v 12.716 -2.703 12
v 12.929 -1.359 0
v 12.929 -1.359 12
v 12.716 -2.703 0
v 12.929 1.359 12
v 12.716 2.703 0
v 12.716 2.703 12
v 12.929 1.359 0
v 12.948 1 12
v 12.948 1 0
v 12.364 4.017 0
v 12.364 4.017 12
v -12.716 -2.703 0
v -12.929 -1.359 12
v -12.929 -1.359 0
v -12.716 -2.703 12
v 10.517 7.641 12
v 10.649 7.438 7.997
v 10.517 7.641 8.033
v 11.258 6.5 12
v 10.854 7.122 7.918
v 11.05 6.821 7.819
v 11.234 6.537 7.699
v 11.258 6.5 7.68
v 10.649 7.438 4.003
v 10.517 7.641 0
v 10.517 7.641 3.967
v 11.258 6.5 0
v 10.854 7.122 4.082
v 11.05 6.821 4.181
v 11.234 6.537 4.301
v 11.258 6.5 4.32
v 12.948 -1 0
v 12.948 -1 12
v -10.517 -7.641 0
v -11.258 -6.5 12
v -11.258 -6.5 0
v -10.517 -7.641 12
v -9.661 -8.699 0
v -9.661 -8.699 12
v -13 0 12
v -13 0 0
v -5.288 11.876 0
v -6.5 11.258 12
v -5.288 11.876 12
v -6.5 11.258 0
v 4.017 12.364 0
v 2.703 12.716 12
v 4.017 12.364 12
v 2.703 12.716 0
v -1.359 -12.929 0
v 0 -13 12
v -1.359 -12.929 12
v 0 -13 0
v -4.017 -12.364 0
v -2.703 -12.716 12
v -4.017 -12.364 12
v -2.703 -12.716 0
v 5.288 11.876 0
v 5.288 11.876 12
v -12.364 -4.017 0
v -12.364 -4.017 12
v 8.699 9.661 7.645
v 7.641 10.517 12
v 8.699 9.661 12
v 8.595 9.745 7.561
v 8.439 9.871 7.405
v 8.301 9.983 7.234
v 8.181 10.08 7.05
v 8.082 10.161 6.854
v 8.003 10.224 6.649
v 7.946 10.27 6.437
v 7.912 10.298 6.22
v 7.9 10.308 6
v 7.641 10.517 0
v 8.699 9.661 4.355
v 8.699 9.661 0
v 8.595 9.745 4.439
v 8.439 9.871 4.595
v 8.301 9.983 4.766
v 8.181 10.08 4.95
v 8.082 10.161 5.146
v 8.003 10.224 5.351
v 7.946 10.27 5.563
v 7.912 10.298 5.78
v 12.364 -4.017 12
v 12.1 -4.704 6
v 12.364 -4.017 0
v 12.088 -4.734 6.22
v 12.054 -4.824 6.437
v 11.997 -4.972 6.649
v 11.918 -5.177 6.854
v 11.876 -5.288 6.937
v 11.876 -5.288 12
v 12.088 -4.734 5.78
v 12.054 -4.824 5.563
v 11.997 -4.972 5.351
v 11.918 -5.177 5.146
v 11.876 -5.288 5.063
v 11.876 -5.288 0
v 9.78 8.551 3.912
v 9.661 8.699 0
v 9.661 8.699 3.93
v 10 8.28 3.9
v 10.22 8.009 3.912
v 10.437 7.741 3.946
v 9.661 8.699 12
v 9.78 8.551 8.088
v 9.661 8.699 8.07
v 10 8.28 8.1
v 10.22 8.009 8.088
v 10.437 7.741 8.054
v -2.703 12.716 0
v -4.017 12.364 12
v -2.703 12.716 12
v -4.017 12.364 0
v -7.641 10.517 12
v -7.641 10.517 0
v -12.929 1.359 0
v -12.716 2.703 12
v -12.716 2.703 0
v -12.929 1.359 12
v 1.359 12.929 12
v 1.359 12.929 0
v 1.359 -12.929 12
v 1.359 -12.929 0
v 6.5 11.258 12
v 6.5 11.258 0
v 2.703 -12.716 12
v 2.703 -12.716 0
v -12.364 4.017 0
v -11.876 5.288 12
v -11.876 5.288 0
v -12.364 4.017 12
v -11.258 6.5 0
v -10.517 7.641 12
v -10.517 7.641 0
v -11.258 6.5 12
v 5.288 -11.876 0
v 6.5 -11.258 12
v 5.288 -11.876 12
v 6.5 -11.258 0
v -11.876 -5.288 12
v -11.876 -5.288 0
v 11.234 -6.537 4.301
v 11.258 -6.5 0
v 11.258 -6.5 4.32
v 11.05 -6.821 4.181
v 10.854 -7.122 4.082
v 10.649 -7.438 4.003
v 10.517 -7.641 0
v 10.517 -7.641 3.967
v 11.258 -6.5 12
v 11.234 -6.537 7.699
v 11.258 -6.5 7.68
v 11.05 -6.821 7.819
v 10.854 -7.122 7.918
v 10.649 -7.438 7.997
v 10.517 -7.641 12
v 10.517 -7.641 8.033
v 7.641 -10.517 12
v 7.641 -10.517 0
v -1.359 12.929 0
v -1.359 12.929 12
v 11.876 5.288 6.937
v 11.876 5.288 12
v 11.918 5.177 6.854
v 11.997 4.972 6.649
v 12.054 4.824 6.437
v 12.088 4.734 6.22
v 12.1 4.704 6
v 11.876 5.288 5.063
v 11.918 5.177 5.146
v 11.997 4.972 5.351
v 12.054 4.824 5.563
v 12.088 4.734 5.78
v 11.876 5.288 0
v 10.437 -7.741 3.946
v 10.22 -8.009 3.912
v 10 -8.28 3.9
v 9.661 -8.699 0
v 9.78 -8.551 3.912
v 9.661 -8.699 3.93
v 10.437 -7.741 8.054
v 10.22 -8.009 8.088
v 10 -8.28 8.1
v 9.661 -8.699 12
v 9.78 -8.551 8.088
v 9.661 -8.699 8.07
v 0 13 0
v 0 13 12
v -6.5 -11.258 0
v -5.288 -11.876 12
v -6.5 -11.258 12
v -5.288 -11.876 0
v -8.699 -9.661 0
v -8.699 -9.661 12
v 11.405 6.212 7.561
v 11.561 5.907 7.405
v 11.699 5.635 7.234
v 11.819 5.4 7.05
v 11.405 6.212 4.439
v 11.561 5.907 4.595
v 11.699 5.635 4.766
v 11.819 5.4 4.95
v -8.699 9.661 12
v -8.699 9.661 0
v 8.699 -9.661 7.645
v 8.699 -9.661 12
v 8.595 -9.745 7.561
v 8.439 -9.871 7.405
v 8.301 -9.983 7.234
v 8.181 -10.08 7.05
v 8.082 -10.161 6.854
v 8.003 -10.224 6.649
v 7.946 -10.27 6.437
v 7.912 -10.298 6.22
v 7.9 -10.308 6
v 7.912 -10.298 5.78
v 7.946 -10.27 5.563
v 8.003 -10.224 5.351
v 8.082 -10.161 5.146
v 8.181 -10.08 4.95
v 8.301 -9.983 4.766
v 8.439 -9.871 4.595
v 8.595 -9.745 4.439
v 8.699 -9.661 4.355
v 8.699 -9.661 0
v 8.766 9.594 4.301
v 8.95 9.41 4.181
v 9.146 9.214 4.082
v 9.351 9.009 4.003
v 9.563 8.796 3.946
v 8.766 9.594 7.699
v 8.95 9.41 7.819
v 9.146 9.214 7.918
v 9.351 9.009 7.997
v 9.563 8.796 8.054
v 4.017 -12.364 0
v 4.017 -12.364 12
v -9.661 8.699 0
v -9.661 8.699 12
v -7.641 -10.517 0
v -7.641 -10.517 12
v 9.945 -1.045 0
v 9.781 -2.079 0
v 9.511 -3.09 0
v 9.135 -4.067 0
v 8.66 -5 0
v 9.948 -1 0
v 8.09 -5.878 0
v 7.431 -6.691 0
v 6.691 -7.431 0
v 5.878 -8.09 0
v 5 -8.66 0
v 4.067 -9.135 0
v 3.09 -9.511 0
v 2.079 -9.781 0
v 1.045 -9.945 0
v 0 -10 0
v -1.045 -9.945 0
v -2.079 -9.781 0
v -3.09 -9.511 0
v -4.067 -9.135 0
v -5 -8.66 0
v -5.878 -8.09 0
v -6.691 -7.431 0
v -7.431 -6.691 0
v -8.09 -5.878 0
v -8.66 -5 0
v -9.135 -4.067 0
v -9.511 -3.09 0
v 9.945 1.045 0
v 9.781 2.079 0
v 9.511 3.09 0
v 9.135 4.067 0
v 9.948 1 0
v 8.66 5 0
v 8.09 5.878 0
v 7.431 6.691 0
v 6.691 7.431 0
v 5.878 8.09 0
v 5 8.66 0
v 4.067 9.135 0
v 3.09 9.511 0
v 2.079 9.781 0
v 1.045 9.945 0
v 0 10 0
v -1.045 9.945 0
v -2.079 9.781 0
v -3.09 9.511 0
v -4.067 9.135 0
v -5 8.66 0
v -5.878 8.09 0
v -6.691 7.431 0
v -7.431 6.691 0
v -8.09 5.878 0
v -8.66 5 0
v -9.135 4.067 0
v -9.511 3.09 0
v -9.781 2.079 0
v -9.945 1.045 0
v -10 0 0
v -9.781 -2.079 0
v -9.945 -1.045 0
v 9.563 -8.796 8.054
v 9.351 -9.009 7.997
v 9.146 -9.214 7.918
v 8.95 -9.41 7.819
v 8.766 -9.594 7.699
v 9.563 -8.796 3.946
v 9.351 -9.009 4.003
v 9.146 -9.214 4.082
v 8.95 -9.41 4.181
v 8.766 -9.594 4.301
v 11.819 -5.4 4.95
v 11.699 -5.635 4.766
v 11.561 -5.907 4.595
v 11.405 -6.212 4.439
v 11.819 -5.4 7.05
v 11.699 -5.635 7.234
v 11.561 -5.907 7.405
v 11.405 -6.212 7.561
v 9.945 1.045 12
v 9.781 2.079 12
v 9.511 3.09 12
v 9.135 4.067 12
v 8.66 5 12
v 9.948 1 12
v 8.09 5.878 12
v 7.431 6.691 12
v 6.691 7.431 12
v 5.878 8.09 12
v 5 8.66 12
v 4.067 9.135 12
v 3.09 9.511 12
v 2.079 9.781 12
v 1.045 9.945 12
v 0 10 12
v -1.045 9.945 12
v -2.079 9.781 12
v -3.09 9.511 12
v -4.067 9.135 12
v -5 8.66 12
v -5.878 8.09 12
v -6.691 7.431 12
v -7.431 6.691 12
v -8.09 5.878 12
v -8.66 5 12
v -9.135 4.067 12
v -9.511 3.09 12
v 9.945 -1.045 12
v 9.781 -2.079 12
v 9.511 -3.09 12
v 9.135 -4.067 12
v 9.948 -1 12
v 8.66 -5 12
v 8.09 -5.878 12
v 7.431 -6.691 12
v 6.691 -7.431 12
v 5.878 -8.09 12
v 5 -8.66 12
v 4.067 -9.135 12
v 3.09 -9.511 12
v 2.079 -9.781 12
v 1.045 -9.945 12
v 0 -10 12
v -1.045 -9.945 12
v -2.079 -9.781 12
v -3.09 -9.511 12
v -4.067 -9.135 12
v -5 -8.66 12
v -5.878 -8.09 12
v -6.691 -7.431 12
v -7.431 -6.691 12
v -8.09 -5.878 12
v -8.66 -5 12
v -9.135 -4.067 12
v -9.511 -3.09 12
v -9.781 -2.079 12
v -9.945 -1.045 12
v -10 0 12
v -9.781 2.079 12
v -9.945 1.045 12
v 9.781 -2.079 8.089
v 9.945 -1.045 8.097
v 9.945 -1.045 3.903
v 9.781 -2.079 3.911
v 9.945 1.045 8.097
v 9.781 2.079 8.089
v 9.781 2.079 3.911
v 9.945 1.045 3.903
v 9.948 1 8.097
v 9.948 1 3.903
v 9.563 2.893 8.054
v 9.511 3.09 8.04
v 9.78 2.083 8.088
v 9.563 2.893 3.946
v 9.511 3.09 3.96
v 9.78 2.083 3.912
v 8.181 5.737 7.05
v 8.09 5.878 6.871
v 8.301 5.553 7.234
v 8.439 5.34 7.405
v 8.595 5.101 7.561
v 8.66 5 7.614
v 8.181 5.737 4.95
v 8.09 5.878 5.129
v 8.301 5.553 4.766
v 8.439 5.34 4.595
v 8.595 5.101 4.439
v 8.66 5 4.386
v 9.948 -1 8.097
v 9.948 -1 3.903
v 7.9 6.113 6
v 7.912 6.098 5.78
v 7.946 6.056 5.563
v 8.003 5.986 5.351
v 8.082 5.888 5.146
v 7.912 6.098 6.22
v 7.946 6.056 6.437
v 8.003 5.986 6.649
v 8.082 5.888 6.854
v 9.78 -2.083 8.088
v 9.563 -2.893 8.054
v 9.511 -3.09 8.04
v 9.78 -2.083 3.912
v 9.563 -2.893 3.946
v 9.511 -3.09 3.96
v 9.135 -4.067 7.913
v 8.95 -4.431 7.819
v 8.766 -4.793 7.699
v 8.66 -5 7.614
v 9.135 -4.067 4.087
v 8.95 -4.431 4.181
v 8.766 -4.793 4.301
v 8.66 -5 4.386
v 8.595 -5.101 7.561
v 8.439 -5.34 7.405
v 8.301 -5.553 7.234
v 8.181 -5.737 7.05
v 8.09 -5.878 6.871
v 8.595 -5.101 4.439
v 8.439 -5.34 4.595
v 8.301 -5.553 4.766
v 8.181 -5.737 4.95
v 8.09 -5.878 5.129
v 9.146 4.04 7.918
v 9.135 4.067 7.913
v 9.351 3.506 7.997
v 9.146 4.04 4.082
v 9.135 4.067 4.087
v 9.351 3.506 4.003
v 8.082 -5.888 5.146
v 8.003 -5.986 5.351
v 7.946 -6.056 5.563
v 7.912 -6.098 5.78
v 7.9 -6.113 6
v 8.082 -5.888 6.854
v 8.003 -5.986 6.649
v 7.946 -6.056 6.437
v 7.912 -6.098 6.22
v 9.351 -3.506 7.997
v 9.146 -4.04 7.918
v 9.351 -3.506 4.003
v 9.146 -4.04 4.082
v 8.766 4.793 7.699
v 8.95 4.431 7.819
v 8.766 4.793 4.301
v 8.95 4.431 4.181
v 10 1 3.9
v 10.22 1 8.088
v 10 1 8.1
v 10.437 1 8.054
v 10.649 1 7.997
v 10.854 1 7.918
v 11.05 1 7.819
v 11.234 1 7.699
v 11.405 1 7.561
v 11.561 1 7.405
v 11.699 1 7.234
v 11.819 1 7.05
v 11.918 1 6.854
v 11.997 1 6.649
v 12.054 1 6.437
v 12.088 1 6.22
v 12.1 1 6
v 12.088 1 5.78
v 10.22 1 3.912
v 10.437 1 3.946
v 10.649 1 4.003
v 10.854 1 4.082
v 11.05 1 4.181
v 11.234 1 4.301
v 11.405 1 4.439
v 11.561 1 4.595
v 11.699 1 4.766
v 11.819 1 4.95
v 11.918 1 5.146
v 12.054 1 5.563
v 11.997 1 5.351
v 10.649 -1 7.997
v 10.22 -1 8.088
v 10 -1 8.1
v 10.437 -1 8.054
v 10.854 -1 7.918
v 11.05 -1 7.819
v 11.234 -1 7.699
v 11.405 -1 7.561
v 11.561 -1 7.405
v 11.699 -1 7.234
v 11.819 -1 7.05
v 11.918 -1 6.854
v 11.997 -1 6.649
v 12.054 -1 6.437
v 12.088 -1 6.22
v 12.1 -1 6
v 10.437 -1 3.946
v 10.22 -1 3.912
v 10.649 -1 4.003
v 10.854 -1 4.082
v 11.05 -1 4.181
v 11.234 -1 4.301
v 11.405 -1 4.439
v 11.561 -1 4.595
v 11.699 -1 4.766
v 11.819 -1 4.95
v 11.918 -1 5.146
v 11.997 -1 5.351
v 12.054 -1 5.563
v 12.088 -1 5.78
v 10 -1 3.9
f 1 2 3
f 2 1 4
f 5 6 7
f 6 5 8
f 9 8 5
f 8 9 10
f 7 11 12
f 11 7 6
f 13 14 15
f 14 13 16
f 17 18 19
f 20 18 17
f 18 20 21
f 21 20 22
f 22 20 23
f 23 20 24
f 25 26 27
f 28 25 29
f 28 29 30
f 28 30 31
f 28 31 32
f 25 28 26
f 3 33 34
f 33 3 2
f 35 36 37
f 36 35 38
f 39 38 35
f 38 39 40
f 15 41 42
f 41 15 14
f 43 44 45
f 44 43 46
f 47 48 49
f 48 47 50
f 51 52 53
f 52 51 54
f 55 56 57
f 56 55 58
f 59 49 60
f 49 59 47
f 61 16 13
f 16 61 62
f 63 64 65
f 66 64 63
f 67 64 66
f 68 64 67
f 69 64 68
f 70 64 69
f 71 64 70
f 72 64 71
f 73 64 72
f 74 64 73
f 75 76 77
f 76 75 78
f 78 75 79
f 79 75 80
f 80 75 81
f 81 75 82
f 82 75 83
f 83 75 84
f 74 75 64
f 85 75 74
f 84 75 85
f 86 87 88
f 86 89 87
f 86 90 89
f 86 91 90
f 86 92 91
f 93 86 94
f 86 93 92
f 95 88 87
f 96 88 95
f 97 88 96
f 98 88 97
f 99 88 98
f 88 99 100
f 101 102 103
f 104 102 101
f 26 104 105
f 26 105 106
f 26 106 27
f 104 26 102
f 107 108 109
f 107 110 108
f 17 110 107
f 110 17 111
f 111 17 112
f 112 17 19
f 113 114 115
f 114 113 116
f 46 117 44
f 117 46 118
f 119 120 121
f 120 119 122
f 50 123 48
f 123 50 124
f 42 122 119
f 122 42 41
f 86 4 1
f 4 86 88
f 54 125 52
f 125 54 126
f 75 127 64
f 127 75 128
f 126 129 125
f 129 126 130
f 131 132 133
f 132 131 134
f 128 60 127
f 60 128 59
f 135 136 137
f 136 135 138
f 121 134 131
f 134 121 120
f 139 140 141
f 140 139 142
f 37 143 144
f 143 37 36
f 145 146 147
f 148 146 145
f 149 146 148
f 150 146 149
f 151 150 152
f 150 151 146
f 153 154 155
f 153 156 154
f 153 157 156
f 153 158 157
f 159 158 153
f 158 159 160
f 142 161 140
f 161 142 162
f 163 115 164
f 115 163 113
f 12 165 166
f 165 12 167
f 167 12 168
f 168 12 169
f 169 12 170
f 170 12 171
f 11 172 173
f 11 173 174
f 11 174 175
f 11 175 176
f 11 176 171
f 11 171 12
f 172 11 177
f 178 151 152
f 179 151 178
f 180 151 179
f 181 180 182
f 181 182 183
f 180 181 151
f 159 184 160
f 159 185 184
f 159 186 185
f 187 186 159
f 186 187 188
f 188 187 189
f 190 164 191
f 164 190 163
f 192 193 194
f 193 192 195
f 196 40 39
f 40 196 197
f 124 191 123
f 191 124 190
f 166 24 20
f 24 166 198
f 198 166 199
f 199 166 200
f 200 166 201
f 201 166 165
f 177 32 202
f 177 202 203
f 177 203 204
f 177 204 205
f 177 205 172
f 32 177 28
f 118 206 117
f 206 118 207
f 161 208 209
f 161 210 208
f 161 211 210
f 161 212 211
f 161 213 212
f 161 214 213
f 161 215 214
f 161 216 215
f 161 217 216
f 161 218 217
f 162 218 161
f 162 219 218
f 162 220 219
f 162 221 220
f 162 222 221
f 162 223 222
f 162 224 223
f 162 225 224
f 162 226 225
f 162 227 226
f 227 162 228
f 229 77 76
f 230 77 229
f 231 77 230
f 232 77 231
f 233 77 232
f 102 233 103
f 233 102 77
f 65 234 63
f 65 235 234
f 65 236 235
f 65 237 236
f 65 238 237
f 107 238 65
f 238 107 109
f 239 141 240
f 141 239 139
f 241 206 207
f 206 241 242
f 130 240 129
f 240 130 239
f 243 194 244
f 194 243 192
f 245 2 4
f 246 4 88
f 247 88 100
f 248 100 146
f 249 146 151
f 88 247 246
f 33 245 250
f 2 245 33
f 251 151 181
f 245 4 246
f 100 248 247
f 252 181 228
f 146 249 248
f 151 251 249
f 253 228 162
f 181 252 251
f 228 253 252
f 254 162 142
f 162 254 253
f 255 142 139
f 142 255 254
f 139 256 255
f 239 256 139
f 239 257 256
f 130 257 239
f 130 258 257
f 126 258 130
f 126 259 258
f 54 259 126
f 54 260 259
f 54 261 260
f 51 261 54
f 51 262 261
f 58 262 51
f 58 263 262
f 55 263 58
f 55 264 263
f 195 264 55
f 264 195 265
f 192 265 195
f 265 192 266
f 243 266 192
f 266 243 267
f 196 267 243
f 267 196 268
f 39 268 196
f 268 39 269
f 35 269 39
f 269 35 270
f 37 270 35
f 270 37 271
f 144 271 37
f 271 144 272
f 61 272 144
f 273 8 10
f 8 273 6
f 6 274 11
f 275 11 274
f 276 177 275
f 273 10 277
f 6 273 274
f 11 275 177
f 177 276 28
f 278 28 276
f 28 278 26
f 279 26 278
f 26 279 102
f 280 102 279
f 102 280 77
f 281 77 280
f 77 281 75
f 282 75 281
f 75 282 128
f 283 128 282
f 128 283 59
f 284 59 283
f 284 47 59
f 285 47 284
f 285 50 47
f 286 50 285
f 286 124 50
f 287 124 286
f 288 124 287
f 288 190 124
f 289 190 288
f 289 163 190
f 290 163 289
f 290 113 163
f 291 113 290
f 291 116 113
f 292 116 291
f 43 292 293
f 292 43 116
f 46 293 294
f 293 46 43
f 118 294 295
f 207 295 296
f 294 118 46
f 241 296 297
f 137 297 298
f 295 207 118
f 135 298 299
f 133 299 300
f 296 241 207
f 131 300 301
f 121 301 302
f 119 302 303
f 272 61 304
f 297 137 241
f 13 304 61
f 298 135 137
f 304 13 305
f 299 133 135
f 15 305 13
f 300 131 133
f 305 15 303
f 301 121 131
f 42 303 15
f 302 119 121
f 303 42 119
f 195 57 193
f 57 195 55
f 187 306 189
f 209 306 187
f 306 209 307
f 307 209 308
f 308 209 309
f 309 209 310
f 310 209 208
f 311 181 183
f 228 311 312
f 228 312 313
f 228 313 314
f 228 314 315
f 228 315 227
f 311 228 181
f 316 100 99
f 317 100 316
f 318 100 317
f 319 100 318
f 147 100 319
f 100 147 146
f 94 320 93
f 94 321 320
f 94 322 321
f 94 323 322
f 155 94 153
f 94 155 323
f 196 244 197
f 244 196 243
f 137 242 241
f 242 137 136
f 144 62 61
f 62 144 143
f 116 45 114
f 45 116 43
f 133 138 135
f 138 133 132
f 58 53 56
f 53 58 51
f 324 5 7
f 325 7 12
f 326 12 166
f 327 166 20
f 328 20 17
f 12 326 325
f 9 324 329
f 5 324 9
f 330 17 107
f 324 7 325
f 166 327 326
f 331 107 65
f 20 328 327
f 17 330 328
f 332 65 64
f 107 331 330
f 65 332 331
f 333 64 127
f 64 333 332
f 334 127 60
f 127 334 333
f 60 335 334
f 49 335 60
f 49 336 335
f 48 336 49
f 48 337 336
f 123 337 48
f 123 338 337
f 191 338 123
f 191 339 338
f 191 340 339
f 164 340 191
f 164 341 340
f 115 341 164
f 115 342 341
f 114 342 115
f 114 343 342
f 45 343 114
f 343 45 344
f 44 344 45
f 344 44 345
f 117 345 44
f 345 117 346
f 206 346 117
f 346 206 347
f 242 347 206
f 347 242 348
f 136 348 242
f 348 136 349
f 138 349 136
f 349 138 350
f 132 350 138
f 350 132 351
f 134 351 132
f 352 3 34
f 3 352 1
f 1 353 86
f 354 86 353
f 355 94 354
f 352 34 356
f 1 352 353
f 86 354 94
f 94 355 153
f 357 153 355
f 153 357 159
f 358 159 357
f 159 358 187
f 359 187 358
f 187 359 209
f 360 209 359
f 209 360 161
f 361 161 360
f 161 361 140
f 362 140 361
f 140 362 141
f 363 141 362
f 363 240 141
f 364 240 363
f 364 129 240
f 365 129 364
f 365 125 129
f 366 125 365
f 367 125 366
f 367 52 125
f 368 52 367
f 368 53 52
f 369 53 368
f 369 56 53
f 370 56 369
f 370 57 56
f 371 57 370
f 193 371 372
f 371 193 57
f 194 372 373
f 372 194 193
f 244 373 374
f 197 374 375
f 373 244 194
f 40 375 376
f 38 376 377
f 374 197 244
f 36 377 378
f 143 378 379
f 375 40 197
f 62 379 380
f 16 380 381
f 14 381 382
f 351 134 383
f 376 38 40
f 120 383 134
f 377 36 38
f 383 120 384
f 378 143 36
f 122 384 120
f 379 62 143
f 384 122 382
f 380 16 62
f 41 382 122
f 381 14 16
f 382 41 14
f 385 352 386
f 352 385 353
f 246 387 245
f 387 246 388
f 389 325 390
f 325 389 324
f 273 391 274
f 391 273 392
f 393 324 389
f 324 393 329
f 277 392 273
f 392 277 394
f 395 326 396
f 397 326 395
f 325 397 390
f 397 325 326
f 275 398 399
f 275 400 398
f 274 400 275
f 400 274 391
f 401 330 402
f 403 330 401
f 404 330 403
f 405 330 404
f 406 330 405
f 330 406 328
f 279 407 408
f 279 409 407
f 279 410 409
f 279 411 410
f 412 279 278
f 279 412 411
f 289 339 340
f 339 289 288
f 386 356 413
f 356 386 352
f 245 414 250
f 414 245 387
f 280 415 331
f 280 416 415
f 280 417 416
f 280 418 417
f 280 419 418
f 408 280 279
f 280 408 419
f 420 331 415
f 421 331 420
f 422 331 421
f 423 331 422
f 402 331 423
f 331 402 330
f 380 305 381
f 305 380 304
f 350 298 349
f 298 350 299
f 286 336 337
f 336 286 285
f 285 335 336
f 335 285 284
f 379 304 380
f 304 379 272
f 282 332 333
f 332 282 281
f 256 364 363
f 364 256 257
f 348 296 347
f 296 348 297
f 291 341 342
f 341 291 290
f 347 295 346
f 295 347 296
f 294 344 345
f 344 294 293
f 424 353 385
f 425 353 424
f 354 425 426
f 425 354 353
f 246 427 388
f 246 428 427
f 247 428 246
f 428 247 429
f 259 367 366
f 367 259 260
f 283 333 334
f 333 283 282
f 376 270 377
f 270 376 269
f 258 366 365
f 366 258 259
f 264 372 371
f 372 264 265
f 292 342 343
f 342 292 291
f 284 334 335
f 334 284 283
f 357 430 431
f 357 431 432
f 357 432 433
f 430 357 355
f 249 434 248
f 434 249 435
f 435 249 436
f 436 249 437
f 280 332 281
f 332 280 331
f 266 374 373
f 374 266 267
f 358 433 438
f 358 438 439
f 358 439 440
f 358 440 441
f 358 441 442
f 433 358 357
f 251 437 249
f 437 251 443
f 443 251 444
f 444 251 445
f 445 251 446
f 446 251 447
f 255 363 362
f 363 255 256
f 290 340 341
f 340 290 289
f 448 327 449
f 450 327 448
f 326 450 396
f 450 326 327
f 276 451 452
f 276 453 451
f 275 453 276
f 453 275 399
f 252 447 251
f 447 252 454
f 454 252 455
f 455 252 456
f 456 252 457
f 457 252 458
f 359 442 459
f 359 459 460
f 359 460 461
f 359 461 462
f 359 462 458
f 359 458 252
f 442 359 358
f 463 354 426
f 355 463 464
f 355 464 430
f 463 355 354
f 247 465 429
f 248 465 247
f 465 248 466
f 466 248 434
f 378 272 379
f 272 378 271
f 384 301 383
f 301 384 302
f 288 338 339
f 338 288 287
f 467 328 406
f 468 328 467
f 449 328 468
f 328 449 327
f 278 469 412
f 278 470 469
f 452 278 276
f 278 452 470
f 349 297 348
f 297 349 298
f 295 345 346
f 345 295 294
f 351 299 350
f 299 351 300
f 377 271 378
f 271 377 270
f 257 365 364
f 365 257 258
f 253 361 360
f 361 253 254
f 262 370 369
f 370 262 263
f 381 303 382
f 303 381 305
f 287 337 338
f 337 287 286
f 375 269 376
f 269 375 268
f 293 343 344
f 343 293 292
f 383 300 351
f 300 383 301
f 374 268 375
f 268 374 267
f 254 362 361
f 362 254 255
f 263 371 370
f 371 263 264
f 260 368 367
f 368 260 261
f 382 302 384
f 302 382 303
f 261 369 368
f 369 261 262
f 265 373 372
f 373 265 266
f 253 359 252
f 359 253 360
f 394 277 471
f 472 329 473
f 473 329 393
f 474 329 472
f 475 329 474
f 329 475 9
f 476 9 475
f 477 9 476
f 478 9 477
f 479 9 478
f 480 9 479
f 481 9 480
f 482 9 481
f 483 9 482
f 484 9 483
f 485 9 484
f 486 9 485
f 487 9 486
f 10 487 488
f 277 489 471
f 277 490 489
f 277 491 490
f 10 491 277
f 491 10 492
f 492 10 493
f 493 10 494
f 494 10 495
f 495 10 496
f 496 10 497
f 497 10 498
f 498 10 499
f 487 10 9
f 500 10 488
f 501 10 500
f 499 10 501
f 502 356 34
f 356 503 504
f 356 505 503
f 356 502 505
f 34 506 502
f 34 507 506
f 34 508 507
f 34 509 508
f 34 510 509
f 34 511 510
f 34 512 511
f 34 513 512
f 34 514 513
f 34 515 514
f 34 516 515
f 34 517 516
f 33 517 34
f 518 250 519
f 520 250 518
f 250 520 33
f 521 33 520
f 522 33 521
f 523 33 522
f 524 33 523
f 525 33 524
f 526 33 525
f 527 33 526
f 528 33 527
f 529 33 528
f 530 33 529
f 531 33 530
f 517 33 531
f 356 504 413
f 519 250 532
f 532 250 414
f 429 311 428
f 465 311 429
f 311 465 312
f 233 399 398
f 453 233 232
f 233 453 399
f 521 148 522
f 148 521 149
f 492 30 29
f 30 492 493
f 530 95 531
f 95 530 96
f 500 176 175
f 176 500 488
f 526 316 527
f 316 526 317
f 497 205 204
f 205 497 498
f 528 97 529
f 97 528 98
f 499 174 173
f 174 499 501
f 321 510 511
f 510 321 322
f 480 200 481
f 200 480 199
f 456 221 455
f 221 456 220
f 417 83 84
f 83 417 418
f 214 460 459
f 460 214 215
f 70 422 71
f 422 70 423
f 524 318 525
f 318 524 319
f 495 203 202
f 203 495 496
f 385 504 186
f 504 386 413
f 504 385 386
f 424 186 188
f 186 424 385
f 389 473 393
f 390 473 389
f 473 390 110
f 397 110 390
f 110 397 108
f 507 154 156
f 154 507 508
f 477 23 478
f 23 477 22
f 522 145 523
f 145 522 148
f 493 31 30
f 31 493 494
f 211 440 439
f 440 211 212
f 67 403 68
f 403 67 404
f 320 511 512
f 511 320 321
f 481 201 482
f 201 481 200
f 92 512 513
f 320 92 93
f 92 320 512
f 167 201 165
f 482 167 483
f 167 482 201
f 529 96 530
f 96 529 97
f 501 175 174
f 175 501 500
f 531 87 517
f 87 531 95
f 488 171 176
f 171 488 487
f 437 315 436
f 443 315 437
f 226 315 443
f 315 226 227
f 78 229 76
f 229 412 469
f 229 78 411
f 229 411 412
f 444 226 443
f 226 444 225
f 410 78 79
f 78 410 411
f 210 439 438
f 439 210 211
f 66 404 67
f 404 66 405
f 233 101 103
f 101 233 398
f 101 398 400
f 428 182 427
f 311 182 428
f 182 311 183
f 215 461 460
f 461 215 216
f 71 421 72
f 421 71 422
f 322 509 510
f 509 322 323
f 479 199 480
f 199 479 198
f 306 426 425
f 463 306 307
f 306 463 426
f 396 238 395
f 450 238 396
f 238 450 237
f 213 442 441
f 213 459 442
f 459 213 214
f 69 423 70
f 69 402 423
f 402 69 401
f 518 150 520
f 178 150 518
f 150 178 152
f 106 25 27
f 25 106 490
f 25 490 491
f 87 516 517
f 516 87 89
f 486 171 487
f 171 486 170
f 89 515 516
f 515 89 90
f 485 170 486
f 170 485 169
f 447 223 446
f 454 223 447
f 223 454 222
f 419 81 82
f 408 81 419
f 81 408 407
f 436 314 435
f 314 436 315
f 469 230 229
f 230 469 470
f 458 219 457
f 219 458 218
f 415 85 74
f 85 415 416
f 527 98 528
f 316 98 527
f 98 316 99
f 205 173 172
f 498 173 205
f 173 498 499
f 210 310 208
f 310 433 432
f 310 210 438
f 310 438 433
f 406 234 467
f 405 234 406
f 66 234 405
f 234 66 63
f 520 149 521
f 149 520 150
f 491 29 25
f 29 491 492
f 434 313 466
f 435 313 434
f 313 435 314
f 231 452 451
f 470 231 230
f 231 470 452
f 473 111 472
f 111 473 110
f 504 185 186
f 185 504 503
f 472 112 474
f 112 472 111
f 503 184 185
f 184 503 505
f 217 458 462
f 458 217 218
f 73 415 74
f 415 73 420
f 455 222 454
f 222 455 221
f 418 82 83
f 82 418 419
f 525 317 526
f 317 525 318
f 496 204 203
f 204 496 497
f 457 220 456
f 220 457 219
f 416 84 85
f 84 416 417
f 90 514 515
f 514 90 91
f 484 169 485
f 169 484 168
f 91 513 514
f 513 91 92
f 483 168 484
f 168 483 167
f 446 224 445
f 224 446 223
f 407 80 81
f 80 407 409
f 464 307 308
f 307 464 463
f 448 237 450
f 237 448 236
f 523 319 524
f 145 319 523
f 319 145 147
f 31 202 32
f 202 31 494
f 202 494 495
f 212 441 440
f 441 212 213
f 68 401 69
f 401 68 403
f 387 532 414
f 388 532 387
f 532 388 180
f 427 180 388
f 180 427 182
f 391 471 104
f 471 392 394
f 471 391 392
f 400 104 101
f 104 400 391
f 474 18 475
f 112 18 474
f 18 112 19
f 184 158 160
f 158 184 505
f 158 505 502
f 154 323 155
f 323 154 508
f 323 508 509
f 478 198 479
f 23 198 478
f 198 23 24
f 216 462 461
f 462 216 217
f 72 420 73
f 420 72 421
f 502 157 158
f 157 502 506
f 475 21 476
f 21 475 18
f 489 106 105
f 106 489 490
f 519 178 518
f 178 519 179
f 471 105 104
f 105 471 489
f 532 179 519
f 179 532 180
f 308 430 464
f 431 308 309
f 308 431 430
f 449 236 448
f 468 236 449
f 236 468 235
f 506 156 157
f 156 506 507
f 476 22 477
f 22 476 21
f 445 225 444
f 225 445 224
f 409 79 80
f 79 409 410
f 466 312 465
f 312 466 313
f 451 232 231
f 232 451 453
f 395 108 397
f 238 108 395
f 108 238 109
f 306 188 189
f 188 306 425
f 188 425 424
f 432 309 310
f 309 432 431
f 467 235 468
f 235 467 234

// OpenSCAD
// C-style pipe clamp.
$fn = 60;
eps = 0.02;
pipe_d = 20;
wall = 3;
outer_d = pipe_d+2*wall;
width = 12;
difference() {
    cylinder(d=outer_d,h=width);
    translate([0,0,-eps]) cylinder(d=pipe_d,h=width+2*eps);
    translate([0,-1,-eps]) cube([outer_d/2+eps,2,width+2*eps]);
    translate([outer_d/2-3,-outer_d/2-eps,width/2]) rotate([-90,0,0]) cylinder(d=4.2,h=outer_d+2*eps);
}
